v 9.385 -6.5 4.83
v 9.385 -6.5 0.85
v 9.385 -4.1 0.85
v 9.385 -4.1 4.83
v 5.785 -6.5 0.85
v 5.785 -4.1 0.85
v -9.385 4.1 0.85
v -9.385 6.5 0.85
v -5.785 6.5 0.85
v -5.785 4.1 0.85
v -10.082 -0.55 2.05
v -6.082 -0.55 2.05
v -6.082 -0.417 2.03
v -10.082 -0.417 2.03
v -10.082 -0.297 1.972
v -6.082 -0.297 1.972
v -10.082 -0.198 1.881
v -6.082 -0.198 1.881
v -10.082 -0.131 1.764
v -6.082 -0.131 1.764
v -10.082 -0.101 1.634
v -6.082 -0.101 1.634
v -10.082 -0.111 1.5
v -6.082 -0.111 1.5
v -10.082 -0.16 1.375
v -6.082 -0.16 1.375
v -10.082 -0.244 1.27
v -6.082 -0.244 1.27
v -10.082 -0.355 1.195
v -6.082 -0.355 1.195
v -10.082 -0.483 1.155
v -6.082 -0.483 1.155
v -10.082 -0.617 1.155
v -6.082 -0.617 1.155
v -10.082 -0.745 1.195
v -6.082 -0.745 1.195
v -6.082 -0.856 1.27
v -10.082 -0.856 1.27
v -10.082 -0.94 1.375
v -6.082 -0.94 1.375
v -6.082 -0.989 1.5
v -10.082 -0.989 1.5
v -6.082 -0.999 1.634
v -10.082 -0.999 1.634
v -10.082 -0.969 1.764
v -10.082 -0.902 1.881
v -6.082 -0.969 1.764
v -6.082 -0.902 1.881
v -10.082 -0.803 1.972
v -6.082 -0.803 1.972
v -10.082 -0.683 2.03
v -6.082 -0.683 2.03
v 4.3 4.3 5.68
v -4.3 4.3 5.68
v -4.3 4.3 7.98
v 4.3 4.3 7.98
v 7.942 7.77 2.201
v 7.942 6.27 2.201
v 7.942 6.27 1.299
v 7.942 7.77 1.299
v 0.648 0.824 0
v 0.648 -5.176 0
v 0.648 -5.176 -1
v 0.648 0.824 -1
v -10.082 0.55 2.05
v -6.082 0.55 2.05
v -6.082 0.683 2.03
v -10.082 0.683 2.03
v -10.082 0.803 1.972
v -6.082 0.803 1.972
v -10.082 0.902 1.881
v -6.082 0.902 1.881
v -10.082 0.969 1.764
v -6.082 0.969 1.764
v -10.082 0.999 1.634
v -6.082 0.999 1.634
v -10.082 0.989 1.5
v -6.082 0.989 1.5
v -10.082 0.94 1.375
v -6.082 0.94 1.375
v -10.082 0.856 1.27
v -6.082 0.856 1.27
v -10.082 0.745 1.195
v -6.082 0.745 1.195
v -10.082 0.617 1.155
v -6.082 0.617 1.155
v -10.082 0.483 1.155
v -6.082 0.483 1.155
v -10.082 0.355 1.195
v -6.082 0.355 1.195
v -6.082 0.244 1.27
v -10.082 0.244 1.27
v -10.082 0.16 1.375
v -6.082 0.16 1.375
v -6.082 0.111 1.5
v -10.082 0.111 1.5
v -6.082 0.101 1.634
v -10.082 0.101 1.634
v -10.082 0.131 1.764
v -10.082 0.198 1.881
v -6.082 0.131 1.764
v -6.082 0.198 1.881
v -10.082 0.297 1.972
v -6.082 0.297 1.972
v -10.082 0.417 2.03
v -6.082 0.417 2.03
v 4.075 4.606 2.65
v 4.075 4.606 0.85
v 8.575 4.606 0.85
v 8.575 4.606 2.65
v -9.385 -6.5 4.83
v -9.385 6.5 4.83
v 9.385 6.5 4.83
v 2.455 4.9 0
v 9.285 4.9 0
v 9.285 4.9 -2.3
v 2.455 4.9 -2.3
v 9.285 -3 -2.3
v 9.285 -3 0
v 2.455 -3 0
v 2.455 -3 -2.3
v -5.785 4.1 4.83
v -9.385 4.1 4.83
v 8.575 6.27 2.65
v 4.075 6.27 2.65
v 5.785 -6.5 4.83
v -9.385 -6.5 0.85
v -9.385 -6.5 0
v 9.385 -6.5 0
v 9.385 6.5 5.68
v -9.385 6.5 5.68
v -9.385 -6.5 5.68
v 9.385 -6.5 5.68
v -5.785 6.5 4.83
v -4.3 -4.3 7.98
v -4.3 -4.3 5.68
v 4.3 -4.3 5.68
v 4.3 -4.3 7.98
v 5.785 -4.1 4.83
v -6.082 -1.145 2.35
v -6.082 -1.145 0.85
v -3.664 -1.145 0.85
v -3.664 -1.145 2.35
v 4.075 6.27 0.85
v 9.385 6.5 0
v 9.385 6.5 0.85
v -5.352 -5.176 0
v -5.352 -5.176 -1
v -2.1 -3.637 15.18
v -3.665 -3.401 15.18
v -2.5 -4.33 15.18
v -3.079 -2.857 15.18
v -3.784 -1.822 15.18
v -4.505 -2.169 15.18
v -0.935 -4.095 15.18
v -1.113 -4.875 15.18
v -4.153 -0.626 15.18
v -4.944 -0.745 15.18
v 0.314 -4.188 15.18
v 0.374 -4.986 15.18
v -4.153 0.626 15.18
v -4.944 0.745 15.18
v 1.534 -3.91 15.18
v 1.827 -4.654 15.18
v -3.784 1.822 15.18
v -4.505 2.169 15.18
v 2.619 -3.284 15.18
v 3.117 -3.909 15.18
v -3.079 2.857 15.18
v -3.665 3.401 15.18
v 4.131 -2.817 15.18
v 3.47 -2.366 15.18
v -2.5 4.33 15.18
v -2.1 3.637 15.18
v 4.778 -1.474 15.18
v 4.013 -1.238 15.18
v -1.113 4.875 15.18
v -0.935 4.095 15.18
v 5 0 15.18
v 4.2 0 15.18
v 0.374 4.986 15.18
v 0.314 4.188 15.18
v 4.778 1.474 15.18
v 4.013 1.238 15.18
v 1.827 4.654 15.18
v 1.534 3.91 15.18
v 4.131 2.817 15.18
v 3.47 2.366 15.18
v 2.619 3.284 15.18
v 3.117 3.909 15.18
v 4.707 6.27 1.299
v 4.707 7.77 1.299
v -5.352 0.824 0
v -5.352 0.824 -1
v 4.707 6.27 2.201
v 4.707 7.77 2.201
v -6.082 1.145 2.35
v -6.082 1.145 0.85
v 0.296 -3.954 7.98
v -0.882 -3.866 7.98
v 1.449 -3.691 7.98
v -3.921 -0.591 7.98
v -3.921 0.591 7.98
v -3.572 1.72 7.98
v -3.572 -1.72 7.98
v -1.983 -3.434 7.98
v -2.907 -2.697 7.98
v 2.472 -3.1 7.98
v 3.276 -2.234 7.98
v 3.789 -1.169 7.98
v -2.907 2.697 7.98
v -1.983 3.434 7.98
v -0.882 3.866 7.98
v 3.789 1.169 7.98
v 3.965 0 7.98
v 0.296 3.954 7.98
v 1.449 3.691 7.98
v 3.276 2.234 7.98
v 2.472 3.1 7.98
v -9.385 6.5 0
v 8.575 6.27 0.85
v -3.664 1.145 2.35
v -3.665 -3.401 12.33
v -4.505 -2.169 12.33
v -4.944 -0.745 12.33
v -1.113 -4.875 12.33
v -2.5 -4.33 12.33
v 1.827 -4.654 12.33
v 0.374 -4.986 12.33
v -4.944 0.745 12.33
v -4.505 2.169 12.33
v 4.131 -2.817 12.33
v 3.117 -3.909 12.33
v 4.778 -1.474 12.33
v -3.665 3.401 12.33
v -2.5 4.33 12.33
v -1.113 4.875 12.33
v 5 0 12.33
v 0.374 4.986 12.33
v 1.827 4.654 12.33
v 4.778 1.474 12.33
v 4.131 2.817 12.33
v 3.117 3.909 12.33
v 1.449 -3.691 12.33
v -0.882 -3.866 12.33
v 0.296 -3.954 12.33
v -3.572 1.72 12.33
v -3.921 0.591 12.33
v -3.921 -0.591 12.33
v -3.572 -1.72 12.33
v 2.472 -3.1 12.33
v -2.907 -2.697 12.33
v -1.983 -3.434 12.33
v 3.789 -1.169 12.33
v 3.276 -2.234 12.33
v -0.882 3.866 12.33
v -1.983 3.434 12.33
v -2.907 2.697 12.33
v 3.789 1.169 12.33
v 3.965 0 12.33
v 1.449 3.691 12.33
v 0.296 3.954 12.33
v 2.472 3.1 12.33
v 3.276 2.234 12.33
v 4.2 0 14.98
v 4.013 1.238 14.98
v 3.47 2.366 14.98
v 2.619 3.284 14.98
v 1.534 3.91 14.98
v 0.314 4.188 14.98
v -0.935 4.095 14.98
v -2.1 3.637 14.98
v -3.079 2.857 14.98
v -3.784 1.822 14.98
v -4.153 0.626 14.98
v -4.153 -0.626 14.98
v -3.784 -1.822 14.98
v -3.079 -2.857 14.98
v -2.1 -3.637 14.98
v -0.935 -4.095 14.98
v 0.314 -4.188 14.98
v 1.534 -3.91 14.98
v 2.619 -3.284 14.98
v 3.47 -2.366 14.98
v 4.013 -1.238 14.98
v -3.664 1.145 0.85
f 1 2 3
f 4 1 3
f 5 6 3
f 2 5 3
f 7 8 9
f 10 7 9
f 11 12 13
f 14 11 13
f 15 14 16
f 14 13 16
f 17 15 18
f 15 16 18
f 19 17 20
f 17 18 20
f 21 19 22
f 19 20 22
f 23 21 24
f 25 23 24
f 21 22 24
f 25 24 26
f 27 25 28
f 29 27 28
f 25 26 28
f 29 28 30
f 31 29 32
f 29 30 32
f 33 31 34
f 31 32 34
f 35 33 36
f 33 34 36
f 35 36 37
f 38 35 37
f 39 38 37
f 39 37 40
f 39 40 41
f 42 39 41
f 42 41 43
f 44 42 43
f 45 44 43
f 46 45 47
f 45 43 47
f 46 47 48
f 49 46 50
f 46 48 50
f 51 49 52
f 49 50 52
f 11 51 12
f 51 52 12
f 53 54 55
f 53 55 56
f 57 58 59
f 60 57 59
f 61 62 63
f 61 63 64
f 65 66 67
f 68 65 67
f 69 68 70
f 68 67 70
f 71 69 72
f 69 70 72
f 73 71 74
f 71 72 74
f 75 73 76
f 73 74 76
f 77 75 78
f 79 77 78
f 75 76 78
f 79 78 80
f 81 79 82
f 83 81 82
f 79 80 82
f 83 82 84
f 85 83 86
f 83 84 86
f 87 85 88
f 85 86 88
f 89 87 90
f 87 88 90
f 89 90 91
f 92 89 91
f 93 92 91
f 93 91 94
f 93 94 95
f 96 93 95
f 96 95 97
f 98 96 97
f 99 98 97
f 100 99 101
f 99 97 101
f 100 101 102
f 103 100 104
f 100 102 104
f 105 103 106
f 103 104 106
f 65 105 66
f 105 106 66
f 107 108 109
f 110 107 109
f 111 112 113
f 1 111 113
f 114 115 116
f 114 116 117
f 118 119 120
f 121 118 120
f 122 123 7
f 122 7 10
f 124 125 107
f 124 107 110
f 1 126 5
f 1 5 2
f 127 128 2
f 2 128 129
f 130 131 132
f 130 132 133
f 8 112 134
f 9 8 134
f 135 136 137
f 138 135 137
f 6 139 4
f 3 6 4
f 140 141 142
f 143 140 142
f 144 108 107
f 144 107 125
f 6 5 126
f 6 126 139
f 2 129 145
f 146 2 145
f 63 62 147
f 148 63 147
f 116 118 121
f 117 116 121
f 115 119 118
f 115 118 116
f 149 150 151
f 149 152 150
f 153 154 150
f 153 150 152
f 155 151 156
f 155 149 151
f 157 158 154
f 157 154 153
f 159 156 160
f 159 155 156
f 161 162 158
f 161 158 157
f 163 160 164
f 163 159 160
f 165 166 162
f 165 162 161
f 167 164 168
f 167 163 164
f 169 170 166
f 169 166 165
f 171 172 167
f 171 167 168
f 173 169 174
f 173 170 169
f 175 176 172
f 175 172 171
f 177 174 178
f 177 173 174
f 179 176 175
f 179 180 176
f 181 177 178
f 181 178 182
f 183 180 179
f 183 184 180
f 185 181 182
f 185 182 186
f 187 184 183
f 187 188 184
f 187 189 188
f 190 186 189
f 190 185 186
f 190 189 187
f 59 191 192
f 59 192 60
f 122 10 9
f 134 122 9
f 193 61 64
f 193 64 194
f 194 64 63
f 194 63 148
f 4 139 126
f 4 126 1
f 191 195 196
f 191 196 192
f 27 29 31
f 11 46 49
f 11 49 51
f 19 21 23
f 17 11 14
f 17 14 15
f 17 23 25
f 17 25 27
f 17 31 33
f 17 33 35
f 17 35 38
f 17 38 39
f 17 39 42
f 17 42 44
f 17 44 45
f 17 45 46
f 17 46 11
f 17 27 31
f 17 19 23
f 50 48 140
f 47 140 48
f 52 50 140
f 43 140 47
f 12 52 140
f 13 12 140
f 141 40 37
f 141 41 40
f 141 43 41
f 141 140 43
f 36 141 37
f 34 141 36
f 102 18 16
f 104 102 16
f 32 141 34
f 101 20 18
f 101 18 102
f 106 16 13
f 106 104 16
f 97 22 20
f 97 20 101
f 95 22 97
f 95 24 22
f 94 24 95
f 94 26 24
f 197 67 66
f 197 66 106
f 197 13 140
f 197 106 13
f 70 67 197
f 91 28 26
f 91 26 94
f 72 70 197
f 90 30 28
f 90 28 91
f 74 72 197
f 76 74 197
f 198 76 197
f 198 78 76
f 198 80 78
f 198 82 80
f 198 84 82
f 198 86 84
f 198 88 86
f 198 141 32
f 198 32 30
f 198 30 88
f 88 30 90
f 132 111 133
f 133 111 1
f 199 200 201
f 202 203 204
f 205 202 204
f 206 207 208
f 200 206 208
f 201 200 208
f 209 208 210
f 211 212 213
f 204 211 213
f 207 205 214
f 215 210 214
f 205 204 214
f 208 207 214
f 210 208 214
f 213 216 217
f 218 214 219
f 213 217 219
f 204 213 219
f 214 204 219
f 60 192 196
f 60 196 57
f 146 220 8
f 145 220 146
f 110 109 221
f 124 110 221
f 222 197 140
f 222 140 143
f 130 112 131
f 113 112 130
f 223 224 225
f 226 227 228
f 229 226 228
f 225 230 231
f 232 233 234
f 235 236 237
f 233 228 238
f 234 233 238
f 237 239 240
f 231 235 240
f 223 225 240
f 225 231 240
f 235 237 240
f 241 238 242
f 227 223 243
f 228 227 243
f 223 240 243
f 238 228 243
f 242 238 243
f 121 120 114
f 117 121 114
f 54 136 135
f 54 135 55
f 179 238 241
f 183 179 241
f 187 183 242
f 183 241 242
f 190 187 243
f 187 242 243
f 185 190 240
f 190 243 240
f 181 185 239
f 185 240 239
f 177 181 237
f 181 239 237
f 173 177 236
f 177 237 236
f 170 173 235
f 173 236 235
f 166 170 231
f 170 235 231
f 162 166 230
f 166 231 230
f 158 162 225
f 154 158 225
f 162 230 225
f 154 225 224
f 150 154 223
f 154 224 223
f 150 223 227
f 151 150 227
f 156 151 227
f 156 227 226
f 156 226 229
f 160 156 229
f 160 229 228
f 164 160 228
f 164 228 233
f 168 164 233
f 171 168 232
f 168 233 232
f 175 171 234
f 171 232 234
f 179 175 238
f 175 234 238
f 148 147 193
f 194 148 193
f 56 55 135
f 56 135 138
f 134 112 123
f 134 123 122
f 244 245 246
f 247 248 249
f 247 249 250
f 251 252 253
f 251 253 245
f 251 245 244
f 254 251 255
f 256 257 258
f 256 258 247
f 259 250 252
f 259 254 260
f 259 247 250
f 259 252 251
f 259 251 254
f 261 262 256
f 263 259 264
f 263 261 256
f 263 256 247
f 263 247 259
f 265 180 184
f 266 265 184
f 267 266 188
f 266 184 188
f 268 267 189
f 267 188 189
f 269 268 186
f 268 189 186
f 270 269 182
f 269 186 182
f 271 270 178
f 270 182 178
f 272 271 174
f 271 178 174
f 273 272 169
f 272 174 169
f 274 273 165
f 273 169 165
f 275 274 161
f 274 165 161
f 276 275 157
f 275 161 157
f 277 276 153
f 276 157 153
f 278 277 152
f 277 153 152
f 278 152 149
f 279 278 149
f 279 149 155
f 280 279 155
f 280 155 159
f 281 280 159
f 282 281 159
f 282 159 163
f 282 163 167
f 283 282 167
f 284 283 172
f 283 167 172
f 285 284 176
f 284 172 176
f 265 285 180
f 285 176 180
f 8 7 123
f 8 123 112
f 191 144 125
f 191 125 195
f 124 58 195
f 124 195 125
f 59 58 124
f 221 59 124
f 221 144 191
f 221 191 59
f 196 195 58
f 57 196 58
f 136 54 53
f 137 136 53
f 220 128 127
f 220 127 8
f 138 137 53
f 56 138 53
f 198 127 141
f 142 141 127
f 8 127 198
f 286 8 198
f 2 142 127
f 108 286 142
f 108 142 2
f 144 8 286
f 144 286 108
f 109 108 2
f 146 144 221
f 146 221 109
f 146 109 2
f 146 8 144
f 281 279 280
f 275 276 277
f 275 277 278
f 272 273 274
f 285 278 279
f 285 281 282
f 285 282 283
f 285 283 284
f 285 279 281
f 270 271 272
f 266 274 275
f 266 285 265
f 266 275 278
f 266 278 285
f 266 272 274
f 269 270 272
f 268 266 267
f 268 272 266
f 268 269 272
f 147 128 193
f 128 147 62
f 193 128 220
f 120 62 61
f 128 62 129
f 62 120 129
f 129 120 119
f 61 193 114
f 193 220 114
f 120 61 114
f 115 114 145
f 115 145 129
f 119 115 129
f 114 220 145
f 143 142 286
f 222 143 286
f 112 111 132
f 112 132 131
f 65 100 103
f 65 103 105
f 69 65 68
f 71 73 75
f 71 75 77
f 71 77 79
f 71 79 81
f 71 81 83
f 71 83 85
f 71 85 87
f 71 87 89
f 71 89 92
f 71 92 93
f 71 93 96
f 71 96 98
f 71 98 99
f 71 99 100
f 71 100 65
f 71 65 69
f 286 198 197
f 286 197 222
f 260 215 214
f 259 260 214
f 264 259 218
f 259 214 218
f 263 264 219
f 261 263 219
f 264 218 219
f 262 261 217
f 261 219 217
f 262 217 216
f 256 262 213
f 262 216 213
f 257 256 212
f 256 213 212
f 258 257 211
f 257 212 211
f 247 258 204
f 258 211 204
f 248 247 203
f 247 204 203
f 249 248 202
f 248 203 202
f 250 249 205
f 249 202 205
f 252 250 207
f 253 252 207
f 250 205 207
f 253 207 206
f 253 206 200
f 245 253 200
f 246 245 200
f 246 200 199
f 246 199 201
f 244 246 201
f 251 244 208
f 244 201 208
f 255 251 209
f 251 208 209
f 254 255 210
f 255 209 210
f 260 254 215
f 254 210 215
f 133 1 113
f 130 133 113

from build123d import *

# Parameters (mm, degrees)
SKETCH1_W             = 18.77
SKETCH1_H             = 13
BOSS_EXTRUDE1_DEPTH   = 0.85
SKETCH2_W             = 3.6
SKETCH2_H             = 2.4
BOSS_EXTRUDE2_DEPTH   = 3.98
BOSS_EXTRUDE2_2_DEPTH = 3.98
SKETCH3_W             = 18.77
SKETCH3_H             = 13
BOSS_EXTRUDE3_DEPTH   = 0.85
SKETCH4_W             = 8.6
SKETCH4_H             = 8.6
BOSS_EXTRUDE4_DEPTH   = 2.3
SKETCH5_R             = 3.965
BOSS_EXTRUDE5_DEPTH   = 4.35
SKETCH6_R             = 5
BOSS_EXTRUDE6_DEPTH   = 2.85
SKETCH7_R             = 4.2
CUT_EXTRUDE1_DEPTH    = 0.2
SKETCH8_W             = 6.83
SKETCH8_H             = 7.9
BOSS_EXTRUDE7_DEPTH   = 2.3
SKETCH9_W             = 6
SKETCH9_H             = 6
BOSS_EXTRUDE8_DEPTH   = 1
SKETCH10_W            = 4.5
SKETCH10_H            = 1.66423566
BOSS_EXTRUDE9_DEPTH   = 1.8
SKETCH11_W            = 3.234818436
SKETCH11_H            = 0.902158146
BOSS_EXTRUDE10_DEPTH  = 1.5
SKETCH12_W            = 2.417880197
SKETCH12_H            = 2.29029457
BOSS_EXTRUDE11_DEPTH  = 1.5
SKETCH13_R            = 0.45
BOSS_EXTRUDE13_DEPTH  = 4


with BuildPart() as part:
    # Sketch1 → Boss-Extrude1 (new body)
    with BuildSketch(Plane.XY):
        Rectangle(SKETCH1_W, SKETCH1_H)
    extrude(amount=BOSS_EXTRUDE1_DEPTH)

    # Sketch8 → Boss-Extrude7 (add)
    with BuildSketch(Plane(origin=(0, 0, 0), x_dir=(-1, 0, 0), z_dir=(0, 0, -1))):
        with Locations((-5.87, 0.95)):
            Rectangle(SKETCH8_W, SKETCH8_H)
    extrude(amount=BOSS_EXTRUDE7_DEPTH)

    # Sketch9 → Boss-Extrude8 (add)
    with BuildSketch(Plane(origin=(0, 0, 0), x_dir=(-1, 0, 0), z_dir=(0, 0, -1))):
        with Locations((2.351912758, -2.176373759)):
            Rectangle(SKETCH9_W, SKETCH9_H)
    extrude(amount=BOSS_EXTRUDE8_DEPTH)

    # Sketch10 → Boss-Extrude9 (add)
    with BuildSketch(Plane.XY.offset(0.85)):
        with Locations((6.324850122, 5.437990757)):
            Rectangle(SKETCH10_W, SKETCH10_H)
    extrude(amount=BOSS_EXTRUDE9_DEPTH)

    # Sketch11 → Boss-Extrude10 (add)
    with BuildSketch(Plane(origin=(0, 6.270108587, 0), x_dir=(1, 0, 0), z_dir=(0, 1, 0))):
        with Locations((6.324850122, -1.75)):
            Rectangle(SKETCH11_W, SKETCH11_H)
    extrude(amount=BOSS_EXTRUDE10_DEPTH)

    # Sketch12 → Boss-Extrude11 (add)
    with BuildSketch(Plane.XY.offset(0.85)):
        with Locations((-4.872863027, 0)):
            Rectangle(SKETCH12_W, SKETCH12_H)
    extrude(amount=BOSS_EXTRUDE11_DEPTH)

    # Sketch13 → Boss-Extrude13 (add)
    with BuildSketch(Plane.ZY.offset(6.081803125)):
        with Locations((1.6, 0.55)):
            Circle(SKETCH13_R)
        with Locations((1.6, -0.55)):
            Circle(SKETCH13_R)
    extrude(amount=BOSS_EXTRUDE13_DEPTH)


with BuildPart() as body_2:
    # Sketch2 → Boss-Extrude2 (new body)
    with BuildSketch(Plane.XY.offset(0.85)):
        with Locations((7.585, -5.3)):
            Rectangle(SKETCH2_W, SKETCH2_H)
    extrude(amount=BOSS_EXTRUDE2_DEPTH)


with BuildPart() as body_3:
    # Sketch2 → Boss-Extrude2 2 (new body)
    with BuildSketch(Plane.XY.offset(0.85)):
        with Locations((-7.585, 5.3)):
            Rectangle(SKETCH2_W, SKETCH2_H)
    extrude(amount=BOSS_EXTRUDE2_2_DEPTH)


with BuildPart() as body_4:
    # Sketch3 → Boss-Extrude3 (new body)
    with BuildSketch(Plane.XY.offset(4.83)):
        Rectangle(SKETCH3_W, SKETCH3_H)
    extrude(amount=BOSS_EXTRUDE3_DEPTH)


with BuildPart() as body_5:
    # Sketch4 → Boss-Extrude4 (new body)
    with BuildSketch(Plane.XY.offset(5.68)):
        Rectangle(SKETCH4_W, SKETCH4_H)
    extrude(amount=BOSS_EXTRUDE4_DEPTH)


with BuildPart() as body_6:
    # Sketch5 → Boss-Extrude5 (new body)
    with BuildSketch(Plane.XY.offset(7.98)):
        Circle(SKETCH5_R)
    extrude(amount=BOSS_EXTRUDE5_DEPTH)


with BuildPart() as body_7:
    # Sketch6 → Boss-Extrude6 (new body)
    with BuildSketch(Plane.XY.offset(12.33)):
        Circle(SKETCH6_R)
    extrude(amount=BOSS_EXTRUDE6_DEPTH)

    # Sketch7 → Cut-Extrude1 (cut)
    with BuildSketch(Plane.XY.offset(15.18)):
        Circle(SKETCH7_R)
    extrude(amount=-CUT_EXTRUDE1_DEPTH, mode=Mode.SUBTRACT)


solid = Compound([part.part, body_2.part, body_3.part, body_4.part, body_5.part, body_6.part, body_7.part])
